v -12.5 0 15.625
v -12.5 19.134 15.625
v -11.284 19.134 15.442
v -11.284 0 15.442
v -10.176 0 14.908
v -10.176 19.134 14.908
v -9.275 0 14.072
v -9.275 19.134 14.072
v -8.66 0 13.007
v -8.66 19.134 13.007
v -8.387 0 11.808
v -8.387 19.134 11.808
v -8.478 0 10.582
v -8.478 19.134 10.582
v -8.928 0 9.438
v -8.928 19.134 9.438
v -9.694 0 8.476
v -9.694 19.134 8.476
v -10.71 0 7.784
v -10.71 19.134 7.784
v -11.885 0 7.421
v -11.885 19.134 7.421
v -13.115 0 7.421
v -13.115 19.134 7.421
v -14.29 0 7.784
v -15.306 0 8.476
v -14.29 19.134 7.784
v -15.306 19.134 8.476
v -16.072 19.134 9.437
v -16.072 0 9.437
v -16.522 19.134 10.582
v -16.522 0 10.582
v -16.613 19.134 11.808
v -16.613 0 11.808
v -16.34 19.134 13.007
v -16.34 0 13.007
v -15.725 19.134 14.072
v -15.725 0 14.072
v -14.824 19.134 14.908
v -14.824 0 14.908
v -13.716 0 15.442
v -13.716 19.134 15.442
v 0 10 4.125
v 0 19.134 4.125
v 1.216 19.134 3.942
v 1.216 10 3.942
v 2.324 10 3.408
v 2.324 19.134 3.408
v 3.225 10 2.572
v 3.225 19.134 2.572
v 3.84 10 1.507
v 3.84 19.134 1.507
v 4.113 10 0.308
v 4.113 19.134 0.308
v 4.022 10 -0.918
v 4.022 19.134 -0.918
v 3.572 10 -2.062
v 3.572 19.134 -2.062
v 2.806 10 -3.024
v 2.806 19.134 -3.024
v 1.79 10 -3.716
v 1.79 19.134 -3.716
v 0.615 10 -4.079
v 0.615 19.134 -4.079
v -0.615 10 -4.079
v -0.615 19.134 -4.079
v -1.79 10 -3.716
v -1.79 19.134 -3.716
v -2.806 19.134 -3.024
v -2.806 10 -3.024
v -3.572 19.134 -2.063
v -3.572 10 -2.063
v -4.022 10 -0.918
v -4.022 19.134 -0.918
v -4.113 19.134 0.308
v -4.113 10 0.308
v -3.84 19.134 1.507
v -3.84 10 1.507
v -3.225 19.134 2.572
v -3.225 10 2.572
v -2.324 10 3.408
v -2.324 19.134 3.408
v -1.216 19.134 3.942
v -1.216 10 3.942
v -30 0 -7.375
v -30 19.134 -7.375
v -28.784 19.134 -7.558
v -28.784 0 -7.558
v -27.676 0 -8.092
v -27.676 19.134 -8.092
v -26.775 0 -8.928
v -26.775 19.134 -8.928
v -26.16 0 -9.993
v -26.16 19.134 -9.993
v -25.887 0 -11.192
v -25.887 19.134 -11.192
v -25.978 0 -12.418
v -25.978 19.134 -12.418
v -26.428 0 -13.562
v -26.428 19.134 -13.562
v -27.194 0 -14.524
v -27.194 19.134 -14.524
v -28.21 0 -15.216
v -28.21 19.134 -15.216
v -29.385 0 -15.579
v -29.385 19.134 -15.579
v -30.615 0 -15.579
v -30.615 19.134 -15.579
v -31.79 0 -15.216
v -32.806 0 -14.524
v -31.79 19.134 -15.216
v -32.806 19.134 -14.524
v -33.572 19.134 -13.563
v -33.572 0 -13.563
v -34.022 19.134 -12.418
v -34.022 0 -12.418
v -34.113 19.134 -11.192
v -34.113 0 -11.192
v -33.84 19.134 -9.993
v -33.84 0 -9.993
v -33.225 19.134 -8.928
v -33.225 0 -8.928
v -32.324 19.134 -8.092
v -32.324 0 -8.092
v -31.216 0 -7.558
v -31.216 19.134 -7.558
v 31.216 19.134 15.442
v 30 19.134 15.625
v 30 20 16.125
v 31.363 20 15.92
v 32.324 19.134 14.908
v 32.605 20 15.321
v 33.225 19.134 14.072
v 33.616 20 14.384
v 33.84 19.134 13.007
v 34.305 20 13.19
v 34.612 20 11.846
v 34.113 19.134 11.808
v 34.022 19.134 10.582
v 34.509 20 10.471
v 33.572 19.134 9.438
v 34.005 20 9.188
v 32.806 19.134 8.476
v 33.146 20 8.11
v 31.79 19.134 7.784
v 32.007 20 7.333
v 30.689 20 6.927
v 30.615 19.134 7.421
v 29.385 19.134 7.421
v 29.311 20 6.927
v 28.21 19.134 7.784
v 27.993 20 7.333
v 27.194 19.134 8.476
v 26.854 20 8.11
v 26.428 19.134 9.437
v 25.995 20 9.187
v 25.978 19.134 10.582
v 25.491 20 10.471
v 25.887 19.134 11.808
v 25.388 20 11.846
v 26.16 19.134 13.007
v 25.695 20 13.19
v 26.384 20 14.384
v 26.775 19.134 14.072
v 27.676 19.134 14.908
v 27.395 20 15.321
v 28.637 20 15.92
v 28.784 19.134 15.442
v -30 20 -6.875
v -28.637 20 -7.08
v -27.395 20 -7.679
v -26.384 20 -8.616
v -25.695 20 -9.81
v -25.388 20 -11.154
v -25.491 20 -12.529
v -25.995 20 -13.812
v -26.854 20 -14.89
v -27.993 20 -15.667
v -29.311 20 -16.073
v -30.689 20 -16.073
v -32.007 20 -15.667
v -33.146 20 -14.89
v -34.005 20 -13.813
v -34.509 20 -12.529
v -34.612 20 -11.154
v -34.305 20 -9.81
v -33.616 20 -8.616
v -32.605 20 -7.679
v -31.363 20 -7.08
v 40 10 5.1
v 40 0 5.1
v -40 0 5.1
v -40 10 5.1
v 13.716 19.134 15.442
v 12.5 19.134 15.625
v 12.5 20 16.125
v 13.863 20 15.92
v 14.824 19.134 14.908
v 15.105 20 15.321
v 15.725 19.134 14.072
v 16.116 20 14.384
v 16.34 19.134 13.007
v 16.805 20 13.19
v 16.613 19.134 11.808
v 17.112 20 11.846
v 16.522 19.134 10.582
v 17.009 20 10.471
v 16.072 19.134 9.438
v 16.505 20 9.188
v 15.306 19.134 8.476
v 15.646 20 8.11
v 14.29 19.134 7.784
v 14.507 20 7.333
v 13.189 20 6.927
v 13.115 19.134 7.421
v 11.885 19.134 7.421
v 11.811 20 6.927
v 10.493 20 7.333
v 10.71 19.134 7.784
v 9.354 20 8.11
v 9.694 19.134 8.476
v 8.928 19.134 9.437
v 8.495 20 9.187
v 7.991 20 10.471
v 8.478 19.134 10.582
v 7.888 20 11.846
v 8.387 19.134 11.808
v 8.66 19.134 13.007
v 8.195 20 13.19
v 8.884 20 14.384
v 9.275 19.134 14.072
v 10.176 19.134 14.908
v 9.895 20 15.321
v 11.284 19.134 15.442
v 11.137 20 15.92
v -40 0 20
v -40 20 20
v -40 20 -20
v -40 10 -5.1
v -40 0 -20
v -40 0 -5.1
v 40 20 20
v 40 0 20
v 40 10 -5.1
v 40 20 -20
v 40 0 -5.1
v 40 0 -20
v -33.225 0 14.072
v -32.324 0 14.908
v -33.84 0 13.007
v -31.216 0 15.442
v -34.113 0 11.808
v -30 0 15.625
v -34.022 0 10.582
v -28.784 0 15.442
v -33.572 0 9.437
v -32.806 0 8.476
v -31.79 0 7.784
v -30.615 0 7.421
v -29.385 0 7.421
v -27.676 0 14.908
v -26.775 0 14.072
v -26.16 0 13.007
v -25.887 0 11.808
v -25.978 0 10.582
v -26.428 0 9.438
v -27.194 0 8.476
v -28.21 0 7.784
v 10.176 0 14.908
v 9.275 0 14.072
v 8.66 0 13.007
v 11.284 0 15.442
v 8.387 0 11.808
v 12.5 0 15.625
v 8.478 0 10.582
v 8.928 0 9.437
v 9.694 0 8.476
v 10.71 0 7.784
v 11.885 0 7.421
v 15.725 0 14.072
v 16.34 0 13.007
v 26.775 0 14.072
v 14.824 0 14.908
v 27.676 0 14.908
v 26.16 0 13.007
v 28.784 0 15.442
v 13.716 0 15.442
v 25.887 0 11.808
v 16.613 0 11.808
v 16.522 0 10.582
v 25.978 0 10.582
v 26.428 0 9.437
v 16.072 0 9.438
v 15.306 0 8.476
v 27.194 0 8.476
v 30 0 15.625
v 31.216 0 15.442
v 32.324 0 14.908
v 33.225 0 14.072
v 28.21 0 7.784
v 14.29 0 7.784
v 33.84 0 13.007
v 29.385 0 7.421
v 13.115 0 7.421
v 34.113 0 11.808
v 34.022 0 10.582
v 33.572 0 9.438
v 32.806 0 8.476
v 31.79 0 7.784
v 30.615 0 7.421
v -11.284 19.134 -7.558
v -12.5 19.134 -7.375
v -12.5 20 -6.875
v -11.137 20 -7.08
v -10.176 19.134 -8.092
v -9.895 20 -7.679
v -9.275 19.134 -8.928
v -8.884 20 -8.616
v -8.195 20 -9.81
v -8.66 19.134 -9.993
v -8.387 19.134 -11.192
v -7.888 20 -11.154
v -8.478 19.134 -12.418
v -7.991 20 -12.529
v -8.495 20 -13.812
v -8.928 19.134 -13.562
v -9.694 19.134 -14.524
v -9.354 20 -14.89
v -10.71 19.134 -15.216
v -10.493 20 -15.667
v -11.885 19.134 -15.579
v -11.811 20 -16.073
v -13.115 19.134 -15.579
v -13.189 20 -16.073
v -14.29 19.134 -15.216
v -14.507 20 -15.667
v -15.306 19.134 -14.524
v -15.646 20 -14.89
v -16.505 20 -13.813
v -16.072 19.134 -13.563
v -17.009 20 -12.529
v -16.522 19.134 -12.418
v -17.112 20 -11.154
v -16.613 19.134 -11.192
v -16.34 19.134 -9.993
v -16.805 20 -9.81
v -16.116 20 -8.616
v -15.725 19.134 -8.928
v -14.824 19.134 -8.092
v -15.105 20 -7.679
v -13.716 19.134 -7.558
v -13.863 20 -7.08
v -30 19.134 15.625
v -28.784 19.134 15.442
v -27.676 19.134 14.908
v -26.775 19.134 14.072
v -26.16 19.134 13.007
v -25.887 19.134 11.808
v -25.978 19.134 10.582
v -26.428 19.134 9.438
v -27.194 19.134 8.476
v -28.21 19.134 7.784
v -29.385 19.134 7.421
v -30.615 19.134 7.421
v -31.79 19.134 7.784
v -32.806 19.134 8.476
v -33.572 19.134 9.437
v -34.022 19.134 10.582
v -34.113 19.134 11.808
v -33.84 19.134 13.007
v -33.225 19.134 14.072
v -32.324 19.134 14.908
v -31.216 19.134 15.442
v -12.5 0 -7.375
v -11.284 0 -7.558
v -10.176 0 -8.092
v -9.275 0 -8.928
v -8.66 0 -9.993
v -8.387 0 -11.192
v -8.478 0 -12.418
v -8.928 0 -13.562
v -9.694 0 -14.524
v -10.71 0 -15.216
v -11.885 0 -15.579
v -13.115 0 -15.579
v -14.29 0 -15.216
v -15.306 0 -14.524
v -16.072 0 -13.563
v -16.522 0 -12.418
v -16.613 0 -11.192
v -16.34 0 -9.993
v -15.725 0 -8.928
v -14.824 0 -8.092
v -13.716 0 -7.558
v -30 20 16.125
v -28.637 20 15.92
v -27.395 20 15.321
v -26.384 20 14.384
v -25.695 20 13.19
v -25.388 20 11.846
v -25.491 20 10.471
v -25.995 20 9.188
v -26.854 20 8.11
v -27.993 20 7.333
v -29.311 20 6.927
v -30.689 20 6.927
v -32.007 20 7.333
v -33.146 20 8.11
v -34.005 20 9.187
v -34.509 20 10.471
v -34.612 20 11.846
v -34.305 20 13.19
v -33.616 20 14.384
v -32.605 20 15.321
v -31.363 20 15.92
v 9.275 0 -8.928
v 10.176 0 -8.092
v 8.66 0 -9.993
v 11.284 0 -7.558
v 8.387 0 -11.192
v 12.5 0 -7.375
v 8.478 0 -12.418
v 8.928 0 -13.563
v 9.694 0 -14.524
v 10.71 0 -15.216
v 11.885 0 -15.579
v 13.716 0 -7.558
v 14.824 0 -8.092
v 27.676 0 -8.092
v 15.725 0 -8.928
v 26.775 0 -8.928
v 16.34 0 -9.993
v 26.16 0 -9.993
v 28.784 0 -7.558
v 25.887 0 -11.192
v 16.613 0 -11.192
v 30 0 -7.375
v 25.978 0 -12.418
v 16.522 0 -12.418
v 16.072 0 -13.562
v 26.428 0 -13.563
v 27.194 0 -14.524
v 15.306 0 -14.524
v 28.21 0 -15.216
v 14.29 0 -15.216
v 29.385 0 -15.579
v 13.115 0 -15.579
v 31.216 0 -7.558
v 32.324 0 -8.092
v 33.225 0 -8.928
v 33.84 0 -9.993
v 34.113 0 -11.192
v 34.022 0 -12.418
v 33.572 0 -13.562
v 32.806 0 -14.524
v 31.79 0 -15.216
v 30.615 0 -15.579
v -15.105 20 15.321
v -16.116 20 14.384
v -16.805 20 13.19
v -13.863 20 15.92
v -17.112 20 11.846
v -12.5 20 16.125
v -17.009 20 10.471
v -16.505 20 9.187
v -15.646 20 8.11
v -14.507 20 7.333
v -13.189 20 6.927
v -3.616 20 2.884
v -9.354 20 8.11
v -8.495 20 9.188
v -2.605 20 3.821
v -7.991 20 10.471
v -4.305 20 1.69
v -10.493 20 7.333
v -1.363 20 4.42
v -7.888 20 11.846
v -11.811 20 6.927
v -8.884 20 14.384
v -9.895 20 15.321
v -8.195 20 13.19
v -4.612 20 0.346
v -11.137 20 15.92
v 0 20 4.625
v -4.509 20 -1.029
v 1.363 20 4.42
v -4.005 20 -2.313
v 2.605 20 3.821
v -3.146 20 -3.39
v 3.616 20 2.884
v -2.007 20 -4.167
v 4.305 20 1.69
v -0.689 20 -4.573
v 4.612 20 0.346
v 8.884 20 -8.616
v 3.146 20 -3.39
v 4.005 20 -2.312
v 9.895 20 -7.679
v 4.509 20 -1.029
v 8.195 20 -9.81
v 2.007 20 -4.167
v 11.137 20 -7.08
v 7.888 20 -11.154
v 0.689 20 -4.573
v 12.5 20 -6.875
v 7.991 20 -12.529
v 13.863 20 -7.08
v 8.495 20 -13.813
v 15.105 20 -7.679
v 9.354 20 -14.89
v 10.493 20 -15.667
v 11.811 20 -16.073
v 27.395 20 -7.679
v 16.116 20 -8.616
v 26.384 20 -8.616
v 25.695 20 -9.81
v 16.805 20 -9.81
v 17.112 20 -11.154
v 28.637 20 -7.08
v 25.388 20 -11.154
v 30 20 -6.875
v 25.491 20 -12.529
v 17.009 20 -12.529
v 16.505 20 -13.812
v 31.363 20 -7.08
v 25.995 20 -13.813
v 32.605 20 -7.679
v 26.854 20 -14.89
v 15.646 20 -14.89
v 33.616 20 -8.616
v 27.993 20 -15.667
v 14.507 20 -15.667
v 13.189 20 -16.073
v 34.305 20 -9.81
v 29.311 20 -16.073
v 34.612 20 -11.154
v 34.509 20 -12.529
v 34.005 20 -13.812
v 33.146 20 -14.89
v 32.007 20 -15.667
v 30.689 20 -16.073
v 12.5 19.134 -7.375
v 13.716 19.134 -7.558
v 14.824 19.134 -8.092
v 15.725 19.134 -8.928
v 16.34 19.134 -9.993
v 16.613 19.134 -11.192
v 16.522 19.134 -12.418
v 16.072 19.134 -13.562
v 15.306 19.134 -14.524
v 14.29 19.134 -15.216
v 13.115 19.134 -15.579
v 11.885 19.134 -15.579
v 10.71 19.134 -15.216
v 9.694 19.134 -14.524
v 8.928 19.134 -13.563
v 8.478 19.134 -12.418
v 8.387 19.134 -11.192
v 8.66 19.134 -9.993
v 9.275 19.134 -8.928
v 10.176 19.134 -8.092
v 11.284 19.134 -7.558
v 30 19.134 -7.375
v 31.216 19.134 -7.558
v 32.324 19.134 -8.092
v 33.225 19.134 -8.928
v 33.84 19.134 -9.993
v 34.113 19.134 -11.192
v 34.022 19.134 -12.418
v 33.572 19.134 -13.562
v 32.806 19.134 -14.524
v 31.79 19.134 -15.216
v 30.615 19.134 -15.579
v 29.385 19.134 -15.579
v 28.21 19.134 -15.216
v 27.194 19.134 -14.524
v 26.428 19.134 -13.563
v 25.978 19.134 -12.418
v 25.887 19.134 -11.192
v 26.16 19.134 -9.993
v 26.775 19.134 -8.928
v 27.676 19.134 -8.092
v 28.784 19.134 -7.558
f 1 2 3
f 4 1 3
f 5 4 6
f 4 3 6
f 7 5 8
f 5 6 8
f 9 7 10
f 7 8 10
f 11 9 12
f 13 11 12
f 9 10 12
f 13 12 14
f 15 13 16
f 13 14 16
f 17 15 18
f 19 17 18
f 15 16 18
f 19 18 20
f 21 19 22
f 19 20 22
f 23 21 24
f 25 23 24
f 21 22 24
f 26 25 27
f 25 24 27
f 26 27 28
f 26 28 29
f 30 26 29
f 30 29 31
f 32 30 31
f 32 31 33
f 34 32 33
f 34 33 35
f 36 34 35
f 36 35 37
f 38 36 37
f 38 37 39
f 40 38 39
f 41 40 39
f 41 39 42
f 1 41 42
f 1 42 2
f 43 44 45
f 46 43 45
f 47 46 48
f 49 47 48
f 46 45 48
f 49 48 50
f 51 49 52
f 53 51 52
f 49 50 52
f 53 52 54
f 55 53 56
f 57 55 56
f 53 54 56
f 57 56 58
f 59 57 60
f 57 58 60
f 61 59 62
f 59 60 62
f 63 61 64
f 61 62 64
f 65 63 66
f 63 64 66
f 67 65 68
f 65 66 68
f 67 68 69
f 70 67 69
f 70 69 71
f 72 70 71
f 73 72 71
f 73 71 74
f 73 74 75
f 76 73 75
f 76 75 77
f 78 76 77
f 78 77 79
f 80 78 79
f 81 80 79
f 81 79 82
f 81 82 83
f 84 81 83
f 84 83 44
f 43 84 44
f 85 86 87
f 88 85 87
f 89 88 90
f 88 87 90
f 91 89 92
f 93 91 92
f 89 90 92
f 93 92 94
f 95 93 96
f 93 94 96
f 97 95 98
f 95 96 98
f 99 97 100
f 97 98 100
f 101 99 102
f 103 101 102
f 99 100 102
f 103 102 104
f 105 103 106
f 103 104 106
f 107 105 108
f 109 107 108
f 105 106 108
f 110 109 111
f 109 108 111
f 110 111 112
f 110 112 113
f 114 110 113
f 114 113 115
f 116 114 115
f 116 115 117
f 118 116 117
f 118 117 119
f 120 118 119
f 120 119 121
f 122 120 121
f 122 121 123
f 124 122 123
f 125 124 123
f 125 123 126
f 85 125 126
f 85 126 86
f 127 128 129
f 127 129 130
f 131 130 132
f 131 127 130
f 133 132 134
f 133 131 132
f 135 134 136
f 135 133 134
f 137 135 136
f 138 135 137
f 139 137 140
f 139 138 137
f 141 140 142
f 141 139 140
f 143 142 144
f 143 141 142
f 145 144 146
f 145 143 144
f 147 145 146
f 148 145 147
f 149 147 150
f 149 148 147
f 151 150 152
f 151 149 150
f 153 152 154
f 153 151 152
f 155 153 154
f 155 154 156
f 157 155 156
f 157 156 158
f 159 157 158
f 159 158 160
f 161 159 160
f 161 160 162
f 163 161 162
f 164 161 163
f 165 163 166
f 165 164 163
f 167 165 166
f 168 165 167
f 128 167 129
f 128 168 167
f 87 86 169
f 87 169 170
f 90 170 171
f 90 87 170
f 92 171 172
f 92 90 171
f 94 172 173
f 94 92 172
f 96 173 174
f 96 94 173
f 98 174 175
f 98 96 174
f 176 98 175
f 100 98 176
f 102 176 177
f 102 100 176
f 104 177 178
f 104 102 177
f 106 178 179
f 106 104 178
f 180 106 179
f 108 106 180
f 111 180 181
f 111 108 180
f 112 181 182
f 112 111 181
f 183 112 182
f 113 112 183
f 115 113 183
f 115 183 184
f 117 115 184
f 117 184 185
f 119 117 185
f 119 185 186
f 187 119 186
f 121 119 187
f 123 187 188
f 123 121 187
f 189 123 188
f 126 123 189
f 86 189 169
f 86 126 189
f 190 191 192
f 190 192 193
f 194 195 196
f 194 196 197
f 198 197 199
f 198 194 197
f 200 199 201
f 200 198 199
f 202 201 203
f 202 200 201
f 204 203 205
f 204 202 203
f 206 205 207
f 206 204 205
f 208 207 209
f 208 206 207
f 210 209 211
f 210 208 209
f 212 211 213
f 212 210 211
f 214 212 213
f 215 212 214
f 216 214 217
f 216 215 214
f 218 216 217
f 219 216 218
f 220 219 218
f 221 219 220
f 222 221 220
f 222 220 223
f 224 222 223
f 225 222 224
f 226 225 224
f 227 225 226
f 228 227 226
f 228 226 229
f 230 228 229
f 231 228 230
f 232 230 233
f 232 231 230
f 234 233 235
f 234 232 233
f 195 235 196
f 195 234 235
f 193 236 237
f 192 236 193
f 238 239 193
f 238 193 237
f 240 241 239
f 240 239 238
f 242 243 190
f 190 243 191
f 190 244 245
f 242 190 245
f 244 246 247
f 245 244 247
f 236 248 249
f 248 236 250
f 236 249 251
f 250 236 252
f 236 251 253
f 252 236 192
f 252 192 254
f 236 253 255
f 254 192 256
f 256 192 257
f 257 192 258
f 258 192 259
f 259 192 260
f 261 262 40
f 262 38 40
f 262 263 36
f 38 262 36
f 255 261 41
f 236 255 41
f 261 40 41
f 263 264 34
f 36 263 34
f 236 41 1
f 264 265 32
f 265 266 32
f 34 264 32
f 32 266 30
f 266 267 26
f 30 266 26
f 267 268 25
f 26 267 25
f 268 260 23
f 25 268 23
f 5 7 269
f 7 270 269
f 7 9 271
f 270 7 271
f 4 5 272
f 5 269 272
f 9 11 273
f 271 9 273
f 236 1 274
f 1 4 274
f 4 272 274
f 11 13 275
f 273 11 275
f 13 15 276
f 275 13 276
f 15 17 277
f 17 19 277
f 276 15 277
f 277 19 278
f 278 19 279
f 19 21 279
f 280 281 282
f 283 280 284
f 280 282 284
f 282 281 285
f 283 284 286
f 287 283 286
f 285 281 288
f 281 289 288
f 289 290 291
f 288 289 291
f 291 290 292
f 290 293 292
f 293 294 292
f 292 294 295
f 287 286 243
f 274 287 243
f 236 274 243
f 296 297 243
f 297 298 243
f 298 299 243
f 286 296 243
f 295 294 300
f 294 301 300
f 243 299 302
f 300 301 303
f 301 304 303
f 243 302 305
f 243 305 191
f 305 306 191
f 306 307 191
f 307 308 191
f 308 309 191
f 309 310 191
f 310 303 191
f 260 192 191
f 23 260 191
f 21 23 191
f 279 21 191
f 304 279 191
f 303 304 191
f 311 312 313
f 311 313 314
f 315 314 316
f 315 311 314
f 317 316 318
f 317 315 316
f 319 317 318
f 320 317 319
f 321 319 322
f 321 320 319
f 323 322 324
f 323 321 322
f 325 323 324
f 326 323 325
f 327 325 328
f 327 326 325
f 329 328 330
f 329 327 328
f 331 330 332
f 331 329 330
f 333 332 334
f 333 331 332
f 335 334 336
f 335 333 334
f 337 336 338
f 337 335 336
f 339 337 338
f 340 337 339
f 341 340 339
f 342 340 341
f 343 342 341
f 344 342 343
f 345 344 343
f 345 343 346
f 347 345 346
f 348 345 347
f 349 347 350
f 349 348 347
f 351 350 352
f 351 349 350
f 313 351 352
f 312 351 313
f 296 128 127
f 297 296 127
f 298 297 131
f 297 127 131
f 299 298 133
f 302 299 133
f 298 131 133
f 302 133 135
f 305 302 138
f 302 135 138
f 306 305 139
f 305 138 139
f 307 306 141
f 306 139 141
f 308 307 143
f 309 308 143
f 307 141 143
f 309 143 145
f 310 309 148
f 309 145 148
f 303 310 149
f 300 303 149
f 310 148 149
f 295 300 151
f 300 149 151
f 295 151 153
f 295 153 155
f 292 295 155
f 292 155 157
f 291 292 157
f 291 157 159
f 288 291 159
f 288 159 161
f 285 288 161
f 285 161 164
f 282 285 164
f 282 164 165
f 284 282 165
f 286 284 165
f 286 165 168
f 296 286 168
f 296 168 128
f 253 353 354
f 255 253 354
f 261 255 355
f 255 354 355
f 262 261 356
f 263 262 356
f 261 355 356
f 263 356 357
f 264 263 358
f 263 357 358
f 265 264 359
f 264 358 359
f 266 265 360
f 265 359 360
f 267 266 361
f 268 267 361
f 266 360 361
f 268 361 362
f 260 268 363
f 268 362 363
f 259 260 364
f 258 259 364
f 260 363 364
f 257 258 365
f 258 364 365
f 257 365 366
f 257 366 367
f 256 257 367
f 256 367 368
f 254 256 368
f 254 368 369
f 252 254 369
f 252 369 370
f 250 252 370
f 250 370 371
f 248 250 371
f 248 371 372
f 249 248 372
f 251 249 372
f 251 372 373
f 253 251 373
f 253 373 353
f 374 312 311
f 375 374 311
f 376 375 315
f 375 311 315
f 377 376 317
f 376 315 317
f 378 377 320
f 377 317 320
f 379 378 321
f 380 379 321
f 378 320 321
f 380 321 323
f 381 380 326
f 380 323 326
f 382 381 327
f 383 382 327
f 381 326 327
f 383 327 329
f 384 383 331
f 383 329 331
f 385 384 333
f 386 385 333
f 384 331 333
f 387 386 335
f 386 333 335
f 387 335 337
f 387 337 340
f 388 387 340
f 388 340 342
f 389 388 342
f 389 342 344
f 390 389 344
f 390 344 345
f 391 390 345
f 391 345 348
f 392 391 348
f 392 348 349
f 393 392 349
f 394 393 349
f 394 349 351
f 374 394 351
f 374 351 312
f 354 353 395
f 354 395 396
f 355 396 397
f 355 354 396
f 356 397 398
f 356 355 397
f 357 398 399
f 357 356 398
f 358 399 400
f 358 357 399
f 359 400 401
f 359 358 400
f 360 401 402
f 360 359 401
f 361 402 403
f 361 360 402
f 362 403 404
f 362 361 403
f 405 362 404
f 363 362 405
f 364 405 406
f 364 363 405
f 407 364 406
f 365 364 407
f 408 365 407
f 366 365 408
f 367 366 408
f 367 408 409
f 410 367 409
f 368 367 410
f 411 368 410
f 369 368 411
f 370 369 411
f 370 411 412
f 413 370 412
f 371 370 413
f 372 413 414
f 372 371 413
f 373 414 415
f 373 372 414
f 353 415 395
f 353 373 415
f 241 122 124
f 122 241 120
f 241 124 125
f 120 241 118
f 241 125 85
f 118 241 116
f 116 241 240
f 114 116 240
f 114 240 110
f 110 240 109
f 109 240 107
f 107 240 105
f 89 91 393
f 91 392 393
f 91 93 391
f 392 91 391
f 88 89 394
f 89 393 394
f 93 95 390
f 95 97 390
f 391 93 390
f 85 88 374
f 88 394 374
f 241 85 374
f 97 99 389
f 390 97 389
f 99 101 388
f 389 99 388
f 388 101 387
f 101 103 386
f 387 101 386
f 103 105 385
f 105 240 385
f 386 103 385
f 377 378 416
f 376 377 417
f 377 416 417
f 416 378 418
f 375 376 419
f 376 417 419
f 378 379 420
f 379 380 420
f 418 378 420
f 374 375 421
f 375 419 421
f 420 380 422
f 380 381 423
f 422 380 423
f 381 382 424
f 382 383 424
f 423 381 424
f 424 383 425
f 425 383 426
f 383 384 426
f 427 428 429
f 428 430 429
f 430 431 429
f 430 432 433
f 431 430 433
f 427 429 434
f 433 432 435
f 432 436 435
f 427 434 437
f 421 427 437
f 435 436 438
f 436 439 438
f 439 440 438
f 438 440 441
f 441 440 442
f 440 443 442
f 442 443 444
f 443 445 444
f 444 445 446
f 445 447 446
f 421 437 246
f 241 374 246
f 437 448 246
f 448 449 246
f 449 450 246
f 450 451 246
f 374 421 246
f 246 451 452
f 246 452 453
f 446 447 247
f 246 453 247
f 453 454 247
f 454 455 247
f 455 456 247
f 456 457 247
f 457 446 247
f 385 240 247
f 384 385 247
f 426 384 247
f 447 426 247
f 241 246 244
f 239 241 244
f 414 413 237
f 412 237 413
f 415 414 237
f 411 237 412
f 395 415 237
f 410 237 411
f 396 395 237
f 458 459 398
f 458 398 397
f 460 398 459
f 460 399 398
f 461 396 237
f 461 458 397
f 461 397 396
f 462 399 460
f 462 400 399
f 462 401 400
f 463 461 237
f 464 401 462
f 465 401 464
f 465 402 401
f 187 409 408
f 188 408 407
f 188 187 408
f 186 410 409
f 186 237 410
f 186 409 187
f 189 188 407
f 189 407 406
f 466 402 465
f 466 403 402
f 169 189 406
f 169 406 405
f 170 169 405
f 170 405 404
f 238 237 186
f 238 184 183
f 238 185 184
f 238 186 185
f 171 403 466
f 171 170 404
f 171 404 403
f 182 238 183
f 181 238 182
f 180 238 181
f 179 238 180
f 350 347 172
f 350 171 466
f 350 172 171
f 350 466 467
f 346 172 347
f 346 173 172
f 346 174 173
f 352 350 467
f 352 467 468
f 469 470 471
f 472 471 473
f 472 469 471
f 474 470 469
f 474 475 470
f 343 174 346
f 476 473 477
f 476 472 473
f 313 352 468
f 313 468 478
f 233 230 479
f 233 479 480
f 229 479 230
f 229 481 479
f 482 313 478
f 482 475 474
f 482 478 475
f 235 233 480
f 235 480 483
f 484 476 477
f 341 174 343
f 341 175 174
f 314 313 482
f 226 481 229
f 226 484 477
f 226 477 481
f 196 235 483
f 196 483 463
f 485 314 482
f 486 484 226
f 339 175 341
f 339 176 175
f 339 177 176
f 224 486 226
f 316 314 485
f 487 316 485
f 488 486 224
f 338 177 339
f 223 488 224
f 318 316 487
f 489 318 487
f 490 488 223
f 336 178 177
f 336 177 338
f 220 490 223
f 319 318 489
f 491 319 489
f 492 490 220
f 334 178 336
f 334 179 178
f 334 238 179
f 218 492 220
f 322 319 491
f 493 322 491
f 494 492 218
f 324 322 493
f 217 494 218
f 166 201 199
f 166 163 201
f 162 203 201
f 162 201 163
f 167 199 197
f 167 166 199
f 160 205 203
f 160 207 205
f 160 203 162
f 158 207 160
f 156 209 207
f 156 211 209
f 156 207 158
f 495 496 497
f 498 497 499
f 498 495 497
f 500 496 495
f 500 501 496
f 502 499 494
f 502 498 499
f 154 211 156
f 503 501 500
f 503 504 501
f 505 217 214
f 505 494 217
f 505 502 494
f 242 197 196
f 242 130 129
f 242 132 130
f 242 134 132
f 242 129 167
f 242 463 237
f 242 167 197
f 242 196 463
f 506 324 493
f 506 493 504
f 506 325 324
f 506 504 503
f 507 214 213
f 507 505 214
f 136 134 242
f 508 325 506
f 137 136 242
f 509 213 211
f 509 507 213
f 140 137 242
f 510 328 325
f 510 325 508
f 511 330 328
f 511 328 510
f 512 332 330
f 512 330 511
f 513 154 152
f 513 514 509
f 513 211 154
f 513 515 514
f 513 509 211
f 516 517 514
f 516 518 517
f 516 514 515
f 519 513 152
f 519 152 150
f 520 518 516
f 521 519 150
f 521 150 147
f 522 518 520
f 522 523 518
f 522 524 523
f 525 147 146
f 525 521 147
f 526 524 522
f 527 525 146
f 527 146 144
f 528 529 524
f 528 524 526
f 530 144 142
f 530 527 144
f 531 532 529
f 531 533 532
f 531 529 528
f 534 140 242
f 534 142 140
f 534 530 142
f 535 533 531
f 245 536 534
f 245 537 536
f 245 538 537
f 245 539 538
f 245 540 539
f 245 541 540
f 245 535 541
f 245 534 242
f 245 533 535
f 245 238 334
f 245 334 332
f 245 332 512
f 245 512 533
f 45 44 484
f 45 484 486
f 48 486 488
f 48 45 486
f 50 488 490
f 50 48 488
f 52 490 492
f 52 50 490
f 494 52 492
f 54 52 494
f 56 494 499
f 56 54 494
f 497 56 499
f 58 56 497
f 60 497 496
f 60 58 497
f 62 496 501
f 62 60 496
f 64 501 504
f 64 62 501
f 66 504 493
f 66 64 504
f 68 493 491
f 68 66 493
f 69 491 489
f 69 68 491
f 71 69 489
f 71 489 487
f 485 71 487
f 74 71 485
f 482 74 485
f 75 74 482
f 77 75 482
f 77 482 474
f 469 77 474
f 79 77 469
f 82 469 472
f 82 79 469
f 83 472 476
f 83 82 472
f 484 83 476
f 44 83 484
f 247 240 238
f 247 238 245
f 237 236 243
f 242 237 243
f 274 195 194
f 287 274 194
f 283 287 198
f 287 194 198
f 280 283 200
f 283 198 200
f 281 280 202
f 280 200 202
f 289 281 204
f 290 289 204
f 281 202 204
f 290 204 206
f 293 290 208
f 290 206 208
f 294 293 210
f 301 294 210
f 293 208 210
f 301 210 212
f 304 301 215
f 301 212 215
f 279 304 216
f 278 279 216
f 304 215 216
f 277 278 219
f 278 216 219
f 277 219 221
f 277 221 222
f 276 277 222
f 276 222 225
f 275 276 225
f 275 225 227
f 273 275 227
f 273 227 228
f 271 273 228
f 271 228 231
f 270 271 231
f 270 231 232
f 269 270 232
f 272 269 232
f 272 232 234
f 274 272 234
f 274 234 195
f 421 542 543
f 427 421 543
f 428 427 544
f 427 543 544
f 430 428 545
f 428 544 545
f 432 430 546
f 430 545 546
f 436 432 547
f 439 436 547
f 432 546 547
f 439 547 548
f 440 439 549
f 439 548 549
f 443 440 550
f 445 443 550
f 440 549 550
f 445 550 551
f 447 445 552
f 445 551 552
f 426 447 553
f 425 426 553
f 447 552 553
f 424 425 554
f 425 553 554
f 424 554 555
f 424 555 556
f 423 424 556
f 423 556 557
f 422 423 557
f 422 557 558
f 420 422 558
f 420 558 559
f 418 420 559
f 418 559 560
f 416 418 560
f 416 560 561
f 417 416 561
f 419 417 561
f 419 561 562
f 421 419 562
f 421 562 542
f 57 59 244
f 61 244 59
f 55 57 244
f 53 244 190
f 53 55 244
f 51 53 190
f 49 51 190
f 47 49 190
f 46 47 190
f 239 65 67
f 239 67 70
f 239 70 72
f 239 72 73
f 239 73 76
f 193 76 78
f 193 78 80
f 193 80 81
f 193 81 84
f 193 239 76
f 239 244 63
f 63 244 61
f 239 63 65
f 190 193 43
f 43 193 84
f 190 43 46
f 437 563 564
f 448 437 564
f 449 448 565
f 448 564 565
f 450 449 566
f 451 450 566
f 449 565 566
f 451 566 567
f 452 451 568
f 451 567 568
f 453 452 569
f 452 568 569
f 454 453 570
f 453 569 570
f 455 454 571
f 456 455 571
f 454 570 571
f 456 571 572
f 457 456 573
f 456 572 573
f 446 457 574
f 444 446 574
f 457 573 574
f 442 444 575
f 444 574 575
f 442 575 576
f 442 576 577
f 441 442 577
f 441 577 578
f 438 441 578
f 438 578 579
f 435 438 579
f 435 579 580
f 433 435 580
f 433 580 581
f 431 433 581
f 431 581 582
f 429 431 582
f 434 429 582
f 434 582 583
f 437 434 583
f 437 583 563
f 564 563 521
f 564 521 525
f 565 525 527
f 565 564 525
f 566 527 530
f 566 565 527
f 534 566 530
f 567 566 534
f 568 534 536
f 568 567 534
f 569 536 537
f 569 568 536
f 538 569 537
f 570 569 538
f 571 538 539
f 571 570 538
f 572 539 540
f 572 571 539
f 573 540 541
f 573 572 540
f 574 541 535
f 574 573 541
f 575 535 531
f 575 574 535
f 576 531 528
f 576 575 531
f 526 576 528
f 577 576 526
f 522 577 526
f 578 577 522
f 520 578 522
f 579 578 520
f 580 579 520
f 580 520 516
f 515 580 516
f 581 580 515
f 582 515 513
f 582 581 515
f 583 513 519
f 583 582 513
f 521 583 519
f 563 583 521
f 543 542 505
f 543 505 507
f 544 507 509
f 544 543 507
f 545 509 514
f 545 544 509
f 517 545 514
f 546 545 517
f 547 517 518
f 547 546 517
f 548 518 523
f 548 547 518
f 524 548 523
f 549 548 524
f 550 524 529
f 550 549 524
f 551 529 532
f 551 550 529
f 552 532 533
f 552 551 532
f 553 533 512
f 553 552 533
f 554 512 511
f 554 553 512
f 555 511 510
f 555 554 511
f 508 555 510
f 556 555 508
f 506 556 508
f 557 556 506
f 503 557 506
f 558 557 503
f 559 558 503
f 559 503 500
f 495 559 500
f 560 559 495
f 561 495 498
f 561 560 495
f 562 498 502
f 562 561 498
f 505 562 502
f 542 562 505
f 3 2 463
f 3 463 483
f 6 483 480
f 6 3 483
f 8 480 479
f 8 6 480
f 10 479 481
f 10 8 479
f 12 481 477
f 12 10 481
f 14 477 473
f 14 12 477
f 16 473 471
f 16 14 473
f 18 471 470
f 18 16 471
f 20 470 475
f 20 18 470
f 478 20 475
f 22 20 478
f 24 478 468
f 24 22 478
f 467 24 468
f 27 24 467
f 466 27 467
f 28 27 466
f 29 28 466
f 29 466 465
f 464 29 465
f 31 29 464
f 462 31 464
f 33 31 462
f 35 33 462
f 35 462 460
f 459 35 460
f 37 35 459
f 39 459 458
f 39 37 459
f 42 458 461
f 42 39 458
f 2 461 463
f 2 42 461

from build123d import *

# Parameters (mm, degrees)
SKETCH1_W           = 80
SKETCH1_H           = 40
BOSS_EXTRUDE1_DEPTH = 20
SKETCH2_W           = 10.2
SKETCH2_H           = 20
CUT_EXTRUDE1_DEPTH  = 81
SKETCH3_R           = 4.125
CUT_EXTRUDE2_DEPTH  = 21
CHAMFER1_SIZE       = 0.5
CHAMFER1_SIZE2      = 0.866025404


with BuildPart() as part:
    # Sketch1 → Boss-Extrude1 (new body)
    with BuildSketch(Plane(origin=(0, 0, 0), x_dir=(1, 0, 0), z_dir=(0, 1, 0))):
        Rectangle(SKETCH1_W, SKETCH1_H)
    extrude(amount=BOSS_EXTRUDE1_DEPTH)

    # Sketch2 → Cut-Extrude1 (cut, through all)
    with BuildSketch(Plane.ZY.offset(40)):
        Rectangle(SKETCH2_W, SKETCH2_H)
    extrude(amount=-CUT_EXTRUDE1_DEPTH, mode=Mode.SUBTRACT)

    # Sketch3 → Cut-Extrude2 (cut, through all)
    with BuildSketch(Plane(origin=(0, 20, 0), x_dir=(1, 0, 0), z_dir=(0, 1, 0))):
        with Locations(Location((12.5, -11.5, 0), (0, 0, 270))):  # turned: the seam where the file's is
            Circle(SKETCH3_R)
        with Locations(Location((-12.5, -11.5, 0), (0, 0, 270))):  # turned: the seam where the file's is
            Circle(SKETCH3_R)
        with Locations(Location((-12.5, 11.5, 0), (0, 0, 270))):  # turned: the seam where the file's is
            Circle(SKETCH3_R)
        with Locations(Location((12.5, 11.5, 0), (0, 0, 270))):  # turned: the seam where the file's is
            Circle(SKETCH3_R)
        with Locations(Location((30, -11.5, 0), (0, 0, 270))):  # turned: the seam where the file's is
            Circle(SKETCH3_R)
        with Locations(Location((-30, -11.5, 0), (0, 0, 270))):  # turned: the seam where the file's is
            Circle(SKETCH3_R)
        with Locations(Location((-30, 11.5, 0), (0, 0, 270))):  # turned: the seam where the file's is
            Circle(SKETCH3_R)
        with Locations(Location((30, 11.5, 0), (0, 0, 270))):  # turned: the seam where the file's is
            Circle(SKETCH3_R)
        with Locations(Location((0, 0, 0), (0, 0, 270))):  # turned: the seam where the file's is
            Circle(SKETCH3_R)
    extrude(amount=-CUT_EXTRUDE2_DEPTH, mode=Mode.SUBTRACT)

    # Chamfer1
    chamfer1_edges = [part.edges().sort_by_distance(p)[0] for p in [
        (12.5, 20, 7.375),
        (0, 20, -4.125),
        (30, 20, -15.625),
        (-30, 20, -15.625),
        (-30, 20, 7.375),
        (30, 20, 7.375),
        (12.5, 20, -15.625),
        (-12.5, 20, -15.625),
        (-12.5, 20, 7.375),
    ]]
    chamfer1_side = [part.faces().sort_by_distance(p)[0] for p in [
        (0, 20, 19.105572809),
    ]]
    chamfer(chamfer1_edges, length=CHAMFER1_SIZE, length2=CHAMFER1_SIZE2, reference=chamfer1_side[0])


solid = part.part
